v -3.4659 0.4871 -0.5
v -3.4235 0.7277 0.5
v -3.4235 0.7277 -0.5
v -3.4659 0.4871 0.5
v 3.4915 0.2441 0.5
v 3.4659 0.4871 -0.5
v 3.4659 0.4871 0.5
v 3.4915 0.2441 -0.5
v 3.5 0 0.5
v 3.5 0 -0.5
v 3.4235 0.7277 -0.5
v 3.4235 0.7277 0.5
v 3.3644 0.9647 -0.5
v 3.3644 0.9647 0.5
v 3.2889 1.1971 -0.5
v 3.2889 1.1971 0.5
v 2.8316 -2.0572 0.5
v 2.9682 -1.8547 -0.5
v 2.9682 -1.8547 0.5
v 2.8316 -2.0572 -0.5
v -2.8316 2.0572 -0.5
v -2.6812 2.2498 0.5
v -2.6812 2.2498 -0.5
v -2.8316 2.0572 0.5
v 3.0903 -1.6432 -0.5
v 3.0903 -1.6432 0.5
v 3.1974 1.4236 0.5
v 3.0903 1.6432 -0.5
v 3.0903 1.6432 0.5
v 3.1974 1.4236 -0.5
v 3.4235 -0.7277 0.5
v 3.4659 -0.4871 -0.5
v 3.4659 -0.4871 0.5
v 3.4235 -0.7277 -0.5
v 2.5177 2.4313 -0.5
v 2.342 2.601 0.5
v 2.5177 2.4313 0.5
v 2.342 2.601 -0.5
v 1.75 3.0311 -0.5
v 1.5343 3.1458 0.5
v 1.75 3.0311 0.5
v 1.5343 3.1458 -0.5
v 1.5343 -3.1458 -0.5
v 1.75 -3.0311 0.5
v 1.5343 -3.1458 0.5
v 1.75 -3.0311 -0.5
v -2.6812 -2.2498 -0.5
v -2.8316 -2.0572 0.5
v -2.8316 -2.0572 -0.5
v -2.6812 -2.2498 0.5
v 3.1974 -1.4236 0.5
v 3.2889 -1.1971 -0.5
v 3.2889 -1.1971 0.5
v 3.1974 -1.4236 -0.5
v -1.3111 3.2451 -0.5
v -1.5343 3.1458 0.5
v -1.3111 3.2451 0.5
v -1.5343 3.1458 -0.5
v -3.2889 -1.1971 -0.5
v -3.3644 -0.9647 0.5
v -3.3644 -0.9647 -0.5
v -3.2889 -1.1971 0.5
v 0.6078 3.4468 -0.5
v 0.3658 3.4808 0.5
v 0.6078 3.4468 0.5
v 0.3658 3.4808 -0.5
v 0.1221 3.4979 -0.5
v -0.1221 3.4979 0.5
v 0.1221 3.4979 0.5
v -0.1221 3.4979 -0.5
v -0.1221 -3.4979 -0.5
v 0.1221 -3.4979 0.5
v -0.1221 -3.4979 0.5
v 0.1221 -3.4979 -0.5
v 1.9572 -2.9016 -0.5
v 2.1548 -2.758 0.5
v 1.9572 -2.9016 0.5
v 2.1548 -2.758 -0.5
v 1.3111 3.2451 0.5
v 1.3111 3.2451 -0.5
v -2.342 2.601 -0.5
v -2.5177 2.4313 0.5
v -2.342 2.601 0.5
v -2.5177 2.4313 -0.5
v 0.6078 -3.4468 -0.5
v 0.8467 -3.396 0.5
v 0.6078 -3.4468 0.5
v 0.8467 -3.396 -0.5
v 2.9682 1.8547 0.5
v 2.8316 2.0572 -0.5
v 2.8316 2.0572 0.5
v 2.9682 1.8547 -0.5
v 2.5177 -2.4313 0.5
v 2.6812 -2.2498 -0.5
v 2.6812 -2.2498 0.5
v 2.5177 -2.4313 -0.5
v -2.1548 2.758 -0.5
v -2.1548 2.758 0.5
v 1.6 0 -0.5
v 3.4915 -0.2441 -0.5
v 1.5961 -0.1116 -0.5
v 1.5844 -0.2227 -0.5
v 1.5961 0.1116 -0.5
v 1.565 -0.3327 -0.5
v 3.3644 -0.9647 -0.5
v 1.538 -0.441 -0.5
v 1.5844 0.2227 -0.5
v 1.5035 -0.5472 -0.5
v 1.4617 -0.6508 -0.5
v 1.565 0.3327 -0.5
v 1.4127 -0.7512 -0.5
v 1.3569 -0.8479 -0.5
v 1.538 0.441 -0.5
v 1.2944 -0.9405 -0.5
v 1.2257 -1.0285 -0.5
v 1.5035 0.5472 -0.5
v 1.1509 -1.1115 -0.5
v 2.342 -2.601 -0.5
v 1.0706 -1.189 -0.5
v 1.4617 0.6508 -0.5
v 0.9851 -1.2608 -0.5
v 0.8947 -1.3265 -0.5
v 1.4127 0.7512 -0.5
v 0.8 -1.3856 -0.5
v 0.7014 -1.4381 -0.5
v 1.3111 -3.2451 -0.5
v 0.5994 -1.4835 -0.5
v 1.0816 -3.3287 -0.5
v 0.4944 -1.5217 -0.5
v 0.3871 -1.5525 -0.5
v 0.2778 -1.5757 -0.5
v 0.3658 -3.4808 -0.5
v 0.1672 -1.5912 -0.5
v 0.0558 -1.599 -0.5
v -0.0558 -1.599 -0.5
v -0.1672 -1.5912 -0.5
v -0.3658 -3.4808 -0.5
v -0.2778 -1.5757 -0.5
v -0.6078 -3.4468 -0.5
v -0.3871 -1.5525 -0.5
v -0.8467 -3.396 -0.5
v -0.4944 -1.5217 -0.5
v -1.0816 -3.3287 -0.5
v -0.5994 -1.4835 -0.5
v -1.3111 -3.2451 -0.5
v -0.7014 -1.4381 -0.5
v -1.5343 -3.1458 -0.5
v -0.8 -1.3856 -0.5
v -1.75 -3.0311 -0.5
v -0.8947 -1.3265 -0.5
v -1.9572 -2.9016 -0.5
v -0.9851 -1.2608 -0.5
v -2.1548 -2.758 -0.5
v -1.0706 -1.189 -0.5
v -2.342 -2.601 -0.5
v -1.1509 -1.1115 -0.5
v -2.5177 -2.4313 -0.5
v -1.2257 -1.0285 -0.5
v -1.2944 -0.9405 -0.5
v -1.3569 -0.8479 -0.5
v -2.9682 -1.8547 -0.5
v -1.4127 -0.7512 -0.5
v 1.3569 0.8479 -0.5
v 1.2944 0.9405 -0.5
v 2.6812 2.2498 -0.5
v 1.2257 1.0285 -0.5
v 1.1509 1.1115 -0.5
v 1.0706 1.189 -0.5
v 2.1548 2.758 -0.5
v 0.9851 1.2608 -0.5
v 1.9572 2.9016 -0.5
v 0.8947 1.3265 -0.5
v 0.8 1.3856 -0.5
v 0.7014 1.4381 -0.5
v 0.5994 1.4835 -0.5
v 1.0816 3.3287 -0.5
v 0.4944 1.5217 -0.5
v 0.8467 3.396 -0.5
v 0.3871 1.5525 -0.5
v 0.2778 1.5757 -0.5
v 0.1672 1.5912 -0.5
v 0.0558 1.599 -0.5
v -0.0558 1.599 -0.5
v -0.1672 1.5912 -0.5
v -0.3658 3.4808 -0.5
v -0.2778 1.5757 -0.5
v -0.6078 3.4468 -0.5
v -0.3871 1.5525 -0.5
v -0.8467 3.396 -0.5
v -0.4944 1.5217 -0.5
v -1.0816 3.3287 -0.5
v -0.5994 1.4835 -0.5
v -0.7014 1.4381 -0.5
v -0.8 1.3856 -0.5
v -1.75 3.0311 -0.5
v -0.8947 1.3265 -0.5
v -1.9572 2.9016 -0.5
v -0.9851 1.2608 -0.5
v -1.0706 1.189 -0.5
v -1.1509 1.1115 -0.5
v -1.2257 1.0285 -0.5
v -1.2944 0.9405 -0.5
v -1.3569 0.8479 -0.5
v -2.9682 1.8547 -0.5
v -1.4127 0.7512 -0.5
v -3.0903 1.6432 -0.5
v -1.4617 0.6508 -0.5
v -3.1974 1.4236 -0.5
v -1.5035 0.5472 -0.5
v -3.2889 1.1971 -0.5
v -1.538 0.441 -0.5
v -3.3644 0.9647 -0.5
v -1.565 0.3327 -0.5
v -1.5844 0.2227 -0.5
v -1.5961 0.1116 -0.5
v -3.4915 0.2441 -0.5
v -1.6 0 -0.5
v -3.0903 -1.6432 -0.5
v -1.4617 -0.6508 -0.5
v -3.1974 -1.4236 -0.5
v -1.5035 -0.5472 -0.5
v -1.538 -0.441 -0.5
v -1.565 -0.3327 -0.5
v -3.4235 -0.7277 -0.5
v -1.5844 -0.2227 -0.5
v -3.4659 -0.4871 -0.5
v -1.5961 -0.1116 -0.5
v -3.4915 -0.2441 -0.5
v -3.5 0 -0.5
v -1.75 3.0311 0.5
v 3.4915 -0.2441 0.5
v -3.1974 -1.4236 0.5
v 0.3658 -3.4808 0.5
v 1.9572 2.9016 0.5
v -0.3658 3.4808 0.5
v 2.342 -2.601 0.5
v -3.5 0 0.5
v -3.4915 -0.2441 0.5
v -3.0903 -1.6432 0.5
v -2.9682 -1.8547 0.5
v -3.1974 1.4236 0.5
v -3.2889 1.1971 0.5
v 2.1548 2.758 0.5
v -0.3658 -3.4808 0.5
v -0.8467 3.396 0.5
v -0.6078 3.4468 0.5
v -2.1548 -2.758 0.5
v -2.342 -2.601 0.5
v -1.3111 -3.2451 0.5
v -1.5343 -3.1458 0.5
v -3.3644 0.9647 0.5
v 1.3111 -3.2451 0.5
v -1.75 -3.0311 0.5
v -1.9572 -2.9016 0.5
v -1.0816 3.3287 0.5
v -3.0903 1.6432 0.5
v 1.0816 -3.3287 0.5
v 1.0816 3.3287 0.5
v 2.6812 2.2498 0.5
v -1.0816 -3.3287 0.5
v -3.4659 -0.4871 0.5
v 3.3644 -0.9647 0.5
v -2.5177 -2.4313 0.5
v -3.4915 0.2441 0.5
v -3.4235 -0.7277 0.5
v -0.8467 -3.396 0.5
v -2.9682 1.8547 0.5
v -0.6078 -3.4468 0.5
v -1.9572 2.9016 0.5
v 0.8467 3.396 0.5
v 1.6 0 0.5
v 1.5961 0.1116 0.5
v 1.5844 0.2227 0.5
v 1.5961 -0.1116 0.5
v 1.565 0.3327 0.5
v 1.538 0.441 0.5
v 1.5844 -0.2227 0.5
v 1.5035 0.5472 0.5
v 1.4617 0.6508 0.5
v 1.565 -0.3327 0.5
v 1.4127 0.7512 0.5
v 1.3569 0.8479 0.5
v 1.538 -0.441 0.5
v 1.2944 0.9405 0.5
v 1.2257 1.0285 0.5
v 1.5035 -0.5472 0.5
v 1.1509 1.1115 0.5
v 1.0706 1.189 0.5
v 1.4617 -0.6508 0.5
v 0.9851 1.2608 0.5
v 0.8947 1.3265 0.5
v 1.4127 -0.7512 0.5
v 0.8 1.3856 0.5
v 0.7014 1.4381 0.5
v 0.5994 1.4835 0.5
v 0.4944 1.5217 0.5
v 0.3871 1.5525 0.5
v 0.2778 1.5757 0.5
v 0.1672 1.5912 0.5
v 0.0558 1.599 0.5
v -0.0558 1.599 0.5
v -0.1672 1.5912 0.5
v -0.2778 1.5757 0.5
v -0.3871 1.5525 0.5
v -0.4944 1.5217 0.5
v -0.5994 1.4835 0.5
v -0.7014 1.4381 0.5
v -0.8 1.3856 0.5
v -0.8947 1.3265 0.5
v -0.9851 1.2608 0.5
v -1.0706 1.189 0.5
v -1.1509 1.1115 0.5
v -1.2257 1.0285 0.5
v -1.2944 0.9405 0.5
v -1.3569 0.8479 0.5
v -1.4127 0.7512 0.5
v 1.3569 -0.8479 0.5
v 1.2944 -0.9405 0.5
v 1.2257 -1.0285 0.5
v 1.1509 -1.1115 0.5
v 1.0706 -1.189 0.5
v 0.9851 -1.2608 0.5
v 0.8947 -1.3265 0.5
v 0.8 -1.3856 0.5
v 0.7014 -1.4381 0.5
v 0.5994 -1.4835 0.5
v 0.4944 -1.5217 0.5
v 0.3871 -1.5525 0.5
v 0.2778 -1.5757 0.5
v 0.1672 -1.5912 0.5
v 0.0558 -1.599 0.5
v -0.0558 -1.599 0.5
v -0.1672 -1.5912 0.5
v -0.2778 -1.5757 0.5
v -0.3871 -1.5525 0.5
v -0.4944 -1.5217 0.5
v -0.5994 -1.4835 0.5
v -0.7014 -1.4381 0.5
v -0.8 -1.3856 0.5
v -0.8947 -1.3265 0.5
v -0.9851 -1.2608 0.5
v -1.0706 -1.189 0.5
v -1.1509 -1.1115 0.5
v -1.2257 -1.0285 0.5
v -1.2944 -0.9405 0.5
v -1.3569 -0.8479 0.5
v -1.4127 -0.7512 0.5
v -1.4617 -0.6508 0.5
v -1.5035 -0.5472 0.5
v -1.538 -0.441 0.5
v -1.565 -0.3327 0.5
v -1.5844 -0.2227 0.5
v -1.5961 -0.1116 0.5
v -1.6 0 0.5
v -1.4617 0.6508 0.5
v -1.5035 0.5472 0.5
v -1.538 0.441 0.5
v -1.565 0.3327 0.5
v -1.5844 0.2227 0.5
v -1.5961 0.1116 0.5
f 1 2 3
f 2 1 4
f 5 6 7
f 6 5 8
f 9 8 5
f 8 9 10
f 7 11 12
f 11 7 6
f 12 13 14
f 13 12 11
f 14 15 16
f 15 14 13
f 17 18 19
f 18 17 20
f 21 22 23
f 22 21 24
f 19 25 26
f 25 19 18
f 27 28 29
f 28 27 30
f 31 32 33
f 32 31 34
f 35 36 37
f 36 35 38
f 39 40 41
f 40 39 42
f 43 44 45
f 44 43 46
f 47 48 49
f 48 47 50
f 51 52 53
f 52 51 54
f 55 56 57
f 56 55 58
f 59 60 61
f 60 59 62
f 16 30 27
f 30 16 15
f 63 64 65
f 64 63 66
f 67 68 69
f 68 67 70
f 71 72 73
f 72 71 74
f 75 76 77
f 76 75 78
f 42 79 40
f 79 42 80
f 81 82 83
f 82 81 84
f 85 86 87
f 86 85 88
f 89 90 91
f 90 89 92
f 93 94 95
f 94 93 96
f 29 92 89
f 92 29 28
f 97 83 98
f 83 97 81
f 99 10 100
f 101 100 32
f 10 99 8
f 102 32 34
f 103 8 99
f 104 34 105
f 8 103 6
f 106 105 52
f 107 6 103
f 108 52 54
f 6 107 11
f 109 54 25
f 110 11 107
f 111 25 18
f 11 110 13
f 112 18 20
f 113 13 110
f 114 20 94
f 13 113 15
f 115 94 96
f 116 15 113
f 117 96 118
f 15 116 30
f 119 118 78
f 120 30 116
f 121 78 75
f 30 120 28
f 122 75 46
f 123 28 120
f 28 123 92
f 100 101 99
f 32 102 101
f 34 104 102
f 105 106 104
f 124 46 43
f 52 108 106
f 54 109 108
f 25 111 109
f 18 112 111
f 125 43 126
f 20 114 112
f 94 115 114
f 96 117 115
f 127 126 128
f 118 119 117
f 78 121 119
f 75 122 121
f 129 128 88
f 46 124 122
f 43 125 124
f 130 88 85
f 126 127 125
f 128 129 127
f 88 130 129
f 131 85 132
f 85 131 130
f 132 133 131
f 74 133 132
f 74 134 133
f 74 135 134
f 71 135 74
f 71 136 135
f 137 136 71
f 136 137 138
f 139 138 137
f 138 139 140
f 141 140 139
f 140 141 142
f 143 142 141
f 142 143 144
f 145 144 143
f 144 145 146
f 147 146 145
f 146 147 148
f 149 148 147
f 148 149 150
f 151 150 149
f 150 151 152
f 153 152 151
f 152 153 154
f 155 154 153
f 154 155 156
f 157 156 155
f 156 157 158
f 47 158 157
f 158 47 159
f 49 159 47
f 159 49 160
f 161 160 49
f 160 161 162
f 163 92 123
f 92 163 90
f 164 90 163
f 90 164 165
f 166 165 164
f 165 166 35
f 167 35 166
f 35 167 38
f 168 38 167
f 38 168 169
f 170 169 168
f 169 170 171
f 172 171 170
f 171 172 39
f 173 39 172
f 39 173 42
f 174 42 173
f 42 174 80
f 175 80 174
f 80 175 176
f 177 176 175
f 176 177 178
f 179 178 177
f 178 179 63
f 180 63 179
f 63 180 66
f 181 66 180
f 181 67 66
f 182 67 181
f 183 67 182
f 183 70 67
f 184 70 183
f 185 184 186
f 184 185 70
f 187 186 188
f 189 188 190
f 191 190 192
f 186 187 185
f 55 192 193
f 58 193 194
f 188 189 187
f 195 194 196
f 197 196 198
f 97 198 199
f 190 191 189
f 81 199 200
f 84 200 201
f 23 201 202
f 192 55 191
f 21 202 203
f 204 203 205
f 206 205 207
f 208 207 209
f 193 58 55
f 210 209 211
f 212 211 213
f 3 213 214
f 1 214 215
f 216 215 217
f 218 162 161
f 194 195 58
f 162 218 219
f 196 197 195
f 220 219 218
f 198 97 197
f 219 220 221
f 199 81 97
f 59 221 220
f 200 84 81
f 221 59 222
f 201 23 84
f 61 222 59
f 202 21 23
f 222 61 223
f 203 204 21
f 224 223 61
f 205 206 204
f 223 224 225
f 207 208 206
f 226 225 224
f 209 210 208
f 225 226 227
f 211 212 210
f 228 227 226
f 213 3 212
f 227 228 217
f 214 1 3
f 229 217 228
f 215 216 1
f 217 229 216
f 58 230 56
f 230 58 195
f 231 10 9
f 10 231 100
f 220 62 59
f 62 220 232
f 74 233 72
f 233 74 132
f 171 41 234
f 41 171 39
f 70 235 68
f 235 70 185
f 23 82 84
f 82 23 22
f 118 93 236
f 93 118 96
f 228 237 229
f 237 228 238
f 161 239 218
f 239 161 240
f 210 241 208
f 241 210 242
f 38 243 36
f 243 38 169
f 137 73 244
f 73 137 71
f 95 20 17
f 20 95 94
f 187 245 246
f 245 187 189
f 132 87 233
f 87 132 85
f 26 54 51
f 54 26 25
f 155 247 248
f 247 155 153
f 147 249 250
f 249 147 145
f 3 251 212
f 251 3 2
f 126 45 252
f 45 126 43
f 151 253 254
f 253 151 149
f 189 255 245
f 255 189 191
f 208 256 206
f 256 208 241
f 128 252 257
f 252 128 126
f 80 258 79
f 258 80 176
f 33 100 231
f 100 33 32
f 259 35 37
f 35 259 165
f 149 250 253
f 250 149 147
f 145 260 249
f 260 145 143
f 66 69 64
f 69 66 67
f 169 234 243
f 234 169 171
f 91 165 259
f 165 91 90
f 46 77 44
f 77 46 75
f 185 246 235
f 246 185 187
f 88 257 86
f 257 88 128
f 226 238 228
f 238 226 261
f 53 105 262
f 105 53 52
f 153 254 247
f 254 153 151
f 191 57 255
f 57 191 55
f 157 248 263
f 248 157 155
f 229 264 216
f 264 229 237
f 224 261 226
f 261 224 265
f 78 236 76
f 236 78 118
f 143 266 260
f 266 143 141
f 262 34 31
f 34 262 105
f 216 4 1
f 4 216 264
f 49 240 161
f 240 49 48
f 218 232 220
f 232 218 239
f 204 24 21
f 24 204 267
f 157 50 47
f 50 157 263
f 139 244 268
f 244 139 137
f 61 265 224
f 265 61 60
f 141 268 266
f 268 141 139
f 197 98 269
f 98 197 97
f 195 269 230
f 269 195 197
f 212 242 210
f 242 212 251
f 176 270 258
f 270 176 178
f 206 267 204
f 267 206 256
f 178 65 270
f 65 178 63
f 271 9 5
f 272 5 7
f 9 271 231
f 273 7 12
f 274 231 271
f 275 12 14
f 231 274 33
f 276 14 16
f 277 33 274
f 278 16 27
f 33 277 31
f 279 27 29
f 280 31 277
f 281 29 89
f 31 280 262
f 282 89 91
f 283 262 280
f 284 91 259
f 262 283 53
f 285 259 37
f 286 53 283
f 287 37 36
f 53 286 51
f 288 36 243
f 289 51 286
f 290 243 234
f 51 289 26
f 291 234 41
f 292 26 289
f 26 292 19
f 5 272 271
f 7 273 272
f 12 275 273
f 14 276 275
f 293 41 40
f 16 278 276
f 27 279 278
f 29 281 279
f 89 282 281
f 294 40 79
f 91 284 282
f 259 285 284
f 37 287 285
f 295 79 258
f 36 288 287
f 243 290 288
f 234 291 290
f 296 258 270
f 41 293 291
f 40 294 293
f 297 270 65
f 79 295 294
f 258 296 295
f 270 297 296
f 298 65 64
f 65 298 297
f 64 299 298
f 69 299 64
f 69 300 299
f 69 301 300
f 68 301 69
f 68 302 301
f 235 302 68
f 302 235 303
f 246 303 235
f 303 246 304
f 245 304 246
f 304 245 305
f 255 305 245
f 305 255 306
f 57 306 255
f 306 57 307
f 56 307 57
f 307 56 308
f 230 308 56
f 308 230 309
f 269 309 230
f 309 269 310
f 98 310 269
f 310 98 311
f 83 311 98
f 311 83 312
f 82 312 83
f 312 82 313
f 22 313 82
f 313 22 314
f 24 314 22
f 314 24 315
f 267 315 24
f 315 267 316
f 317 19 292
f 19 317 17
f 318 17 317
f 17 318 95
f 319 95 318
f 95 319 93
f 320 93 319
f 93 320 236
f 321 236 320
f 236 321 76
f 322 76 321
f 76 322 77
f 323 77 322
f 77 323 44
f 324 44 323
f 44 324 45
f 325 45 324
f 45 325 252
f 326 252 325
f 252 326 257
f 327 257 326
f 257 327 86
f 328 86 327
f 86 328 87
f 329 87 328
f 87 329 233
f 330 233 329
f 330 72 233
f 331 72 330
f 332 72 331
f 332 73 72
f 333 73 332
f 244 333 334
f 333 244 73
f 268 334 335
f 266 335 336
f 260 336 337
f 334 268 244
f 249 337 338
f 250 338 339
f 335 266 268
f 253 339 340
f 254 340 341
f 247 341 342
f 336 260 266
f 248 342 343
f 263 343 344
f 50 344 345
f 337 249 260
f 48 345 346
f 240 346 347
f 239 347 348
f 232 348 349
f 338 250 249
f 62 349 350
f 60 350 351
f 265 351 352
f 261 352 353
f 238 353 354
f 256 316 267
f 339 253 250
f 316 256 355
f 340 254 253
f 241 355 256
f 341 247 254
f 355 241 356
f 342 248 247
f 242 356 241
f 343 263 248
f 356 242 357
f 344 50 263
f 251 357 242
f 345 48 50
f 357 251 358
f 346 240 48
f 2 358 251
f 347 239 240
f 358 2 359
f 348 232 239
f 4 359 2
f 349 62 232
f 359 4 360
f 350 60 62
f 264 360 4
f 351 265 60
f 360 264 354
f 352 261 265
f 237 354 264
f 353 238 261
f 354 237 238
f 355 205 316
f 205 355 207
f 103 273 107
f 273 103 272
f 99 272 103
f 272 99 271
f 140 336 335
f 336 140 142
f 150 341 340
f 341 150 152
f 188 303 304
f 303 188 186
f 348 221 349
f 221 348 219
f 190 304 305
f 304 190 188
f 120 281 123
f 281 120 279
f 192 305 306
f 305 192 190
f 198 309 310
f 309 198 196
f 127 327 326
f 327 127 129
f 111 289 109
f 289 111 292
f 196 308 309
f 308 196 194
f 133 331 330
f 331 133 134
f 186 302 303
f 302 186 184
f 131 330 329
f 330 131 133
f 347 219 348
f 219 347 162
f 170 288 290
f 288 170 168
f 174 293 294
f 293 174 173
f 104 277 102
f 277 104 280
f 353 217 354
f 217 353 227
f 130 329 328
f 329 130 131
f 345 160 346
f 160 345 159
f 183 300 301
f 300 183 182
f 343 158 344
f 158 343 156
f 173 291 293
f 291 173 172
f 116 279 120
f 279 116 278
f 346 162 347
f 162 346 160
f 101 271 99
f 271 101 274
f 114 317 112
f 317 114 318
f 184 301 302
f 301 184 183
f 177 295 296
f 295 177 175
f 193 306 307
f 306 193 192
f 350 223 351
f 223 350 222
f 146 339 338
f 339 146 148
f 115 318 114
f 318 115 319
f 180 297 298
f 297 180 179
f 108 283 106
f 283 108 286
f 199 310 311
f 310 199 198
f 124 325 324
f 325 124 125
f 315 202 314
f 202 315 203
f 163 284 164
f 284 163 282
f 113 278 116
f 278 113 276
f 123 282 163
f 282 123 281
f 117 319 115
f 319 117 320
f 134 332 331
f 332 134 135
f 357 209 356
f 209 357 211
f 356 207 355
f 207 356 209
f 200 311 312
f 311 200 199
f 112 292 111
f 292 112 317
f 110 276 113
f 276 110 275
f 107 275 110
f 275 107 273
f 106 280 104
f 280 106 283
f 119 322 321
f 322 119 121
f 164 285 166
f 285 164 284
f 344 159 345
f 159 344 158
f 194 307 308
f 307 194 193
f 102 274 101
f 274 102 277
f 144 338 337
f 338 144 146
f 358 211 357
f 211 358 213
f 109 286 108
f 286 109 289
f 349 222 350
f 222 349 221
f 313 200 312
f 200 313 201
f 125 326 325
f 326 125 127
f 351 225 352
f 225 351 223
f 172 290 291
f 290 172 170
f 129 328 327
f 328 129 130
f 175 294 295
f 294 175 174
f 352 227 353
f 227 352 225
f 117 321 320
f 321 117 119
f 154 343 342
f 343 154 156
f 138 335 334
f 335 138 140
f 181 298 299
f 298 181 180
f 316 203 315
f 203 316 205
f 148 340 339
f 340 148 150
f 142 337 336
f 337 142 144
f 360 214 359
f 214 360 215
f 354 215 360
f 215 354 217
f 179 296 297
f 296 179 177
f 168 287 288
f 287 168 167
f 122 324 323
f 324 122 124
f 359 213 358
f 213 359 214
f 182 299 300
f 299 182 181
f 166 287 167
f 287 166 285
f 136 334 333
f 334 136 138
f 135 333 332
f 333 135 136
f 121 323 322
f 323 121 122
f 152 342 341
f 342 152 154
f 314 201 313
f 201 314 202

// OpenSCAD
$fn=90;
difference(){
    cylinder(1,d=7,center=true);
    cylinder(2,d=3.2,center=true);
}
